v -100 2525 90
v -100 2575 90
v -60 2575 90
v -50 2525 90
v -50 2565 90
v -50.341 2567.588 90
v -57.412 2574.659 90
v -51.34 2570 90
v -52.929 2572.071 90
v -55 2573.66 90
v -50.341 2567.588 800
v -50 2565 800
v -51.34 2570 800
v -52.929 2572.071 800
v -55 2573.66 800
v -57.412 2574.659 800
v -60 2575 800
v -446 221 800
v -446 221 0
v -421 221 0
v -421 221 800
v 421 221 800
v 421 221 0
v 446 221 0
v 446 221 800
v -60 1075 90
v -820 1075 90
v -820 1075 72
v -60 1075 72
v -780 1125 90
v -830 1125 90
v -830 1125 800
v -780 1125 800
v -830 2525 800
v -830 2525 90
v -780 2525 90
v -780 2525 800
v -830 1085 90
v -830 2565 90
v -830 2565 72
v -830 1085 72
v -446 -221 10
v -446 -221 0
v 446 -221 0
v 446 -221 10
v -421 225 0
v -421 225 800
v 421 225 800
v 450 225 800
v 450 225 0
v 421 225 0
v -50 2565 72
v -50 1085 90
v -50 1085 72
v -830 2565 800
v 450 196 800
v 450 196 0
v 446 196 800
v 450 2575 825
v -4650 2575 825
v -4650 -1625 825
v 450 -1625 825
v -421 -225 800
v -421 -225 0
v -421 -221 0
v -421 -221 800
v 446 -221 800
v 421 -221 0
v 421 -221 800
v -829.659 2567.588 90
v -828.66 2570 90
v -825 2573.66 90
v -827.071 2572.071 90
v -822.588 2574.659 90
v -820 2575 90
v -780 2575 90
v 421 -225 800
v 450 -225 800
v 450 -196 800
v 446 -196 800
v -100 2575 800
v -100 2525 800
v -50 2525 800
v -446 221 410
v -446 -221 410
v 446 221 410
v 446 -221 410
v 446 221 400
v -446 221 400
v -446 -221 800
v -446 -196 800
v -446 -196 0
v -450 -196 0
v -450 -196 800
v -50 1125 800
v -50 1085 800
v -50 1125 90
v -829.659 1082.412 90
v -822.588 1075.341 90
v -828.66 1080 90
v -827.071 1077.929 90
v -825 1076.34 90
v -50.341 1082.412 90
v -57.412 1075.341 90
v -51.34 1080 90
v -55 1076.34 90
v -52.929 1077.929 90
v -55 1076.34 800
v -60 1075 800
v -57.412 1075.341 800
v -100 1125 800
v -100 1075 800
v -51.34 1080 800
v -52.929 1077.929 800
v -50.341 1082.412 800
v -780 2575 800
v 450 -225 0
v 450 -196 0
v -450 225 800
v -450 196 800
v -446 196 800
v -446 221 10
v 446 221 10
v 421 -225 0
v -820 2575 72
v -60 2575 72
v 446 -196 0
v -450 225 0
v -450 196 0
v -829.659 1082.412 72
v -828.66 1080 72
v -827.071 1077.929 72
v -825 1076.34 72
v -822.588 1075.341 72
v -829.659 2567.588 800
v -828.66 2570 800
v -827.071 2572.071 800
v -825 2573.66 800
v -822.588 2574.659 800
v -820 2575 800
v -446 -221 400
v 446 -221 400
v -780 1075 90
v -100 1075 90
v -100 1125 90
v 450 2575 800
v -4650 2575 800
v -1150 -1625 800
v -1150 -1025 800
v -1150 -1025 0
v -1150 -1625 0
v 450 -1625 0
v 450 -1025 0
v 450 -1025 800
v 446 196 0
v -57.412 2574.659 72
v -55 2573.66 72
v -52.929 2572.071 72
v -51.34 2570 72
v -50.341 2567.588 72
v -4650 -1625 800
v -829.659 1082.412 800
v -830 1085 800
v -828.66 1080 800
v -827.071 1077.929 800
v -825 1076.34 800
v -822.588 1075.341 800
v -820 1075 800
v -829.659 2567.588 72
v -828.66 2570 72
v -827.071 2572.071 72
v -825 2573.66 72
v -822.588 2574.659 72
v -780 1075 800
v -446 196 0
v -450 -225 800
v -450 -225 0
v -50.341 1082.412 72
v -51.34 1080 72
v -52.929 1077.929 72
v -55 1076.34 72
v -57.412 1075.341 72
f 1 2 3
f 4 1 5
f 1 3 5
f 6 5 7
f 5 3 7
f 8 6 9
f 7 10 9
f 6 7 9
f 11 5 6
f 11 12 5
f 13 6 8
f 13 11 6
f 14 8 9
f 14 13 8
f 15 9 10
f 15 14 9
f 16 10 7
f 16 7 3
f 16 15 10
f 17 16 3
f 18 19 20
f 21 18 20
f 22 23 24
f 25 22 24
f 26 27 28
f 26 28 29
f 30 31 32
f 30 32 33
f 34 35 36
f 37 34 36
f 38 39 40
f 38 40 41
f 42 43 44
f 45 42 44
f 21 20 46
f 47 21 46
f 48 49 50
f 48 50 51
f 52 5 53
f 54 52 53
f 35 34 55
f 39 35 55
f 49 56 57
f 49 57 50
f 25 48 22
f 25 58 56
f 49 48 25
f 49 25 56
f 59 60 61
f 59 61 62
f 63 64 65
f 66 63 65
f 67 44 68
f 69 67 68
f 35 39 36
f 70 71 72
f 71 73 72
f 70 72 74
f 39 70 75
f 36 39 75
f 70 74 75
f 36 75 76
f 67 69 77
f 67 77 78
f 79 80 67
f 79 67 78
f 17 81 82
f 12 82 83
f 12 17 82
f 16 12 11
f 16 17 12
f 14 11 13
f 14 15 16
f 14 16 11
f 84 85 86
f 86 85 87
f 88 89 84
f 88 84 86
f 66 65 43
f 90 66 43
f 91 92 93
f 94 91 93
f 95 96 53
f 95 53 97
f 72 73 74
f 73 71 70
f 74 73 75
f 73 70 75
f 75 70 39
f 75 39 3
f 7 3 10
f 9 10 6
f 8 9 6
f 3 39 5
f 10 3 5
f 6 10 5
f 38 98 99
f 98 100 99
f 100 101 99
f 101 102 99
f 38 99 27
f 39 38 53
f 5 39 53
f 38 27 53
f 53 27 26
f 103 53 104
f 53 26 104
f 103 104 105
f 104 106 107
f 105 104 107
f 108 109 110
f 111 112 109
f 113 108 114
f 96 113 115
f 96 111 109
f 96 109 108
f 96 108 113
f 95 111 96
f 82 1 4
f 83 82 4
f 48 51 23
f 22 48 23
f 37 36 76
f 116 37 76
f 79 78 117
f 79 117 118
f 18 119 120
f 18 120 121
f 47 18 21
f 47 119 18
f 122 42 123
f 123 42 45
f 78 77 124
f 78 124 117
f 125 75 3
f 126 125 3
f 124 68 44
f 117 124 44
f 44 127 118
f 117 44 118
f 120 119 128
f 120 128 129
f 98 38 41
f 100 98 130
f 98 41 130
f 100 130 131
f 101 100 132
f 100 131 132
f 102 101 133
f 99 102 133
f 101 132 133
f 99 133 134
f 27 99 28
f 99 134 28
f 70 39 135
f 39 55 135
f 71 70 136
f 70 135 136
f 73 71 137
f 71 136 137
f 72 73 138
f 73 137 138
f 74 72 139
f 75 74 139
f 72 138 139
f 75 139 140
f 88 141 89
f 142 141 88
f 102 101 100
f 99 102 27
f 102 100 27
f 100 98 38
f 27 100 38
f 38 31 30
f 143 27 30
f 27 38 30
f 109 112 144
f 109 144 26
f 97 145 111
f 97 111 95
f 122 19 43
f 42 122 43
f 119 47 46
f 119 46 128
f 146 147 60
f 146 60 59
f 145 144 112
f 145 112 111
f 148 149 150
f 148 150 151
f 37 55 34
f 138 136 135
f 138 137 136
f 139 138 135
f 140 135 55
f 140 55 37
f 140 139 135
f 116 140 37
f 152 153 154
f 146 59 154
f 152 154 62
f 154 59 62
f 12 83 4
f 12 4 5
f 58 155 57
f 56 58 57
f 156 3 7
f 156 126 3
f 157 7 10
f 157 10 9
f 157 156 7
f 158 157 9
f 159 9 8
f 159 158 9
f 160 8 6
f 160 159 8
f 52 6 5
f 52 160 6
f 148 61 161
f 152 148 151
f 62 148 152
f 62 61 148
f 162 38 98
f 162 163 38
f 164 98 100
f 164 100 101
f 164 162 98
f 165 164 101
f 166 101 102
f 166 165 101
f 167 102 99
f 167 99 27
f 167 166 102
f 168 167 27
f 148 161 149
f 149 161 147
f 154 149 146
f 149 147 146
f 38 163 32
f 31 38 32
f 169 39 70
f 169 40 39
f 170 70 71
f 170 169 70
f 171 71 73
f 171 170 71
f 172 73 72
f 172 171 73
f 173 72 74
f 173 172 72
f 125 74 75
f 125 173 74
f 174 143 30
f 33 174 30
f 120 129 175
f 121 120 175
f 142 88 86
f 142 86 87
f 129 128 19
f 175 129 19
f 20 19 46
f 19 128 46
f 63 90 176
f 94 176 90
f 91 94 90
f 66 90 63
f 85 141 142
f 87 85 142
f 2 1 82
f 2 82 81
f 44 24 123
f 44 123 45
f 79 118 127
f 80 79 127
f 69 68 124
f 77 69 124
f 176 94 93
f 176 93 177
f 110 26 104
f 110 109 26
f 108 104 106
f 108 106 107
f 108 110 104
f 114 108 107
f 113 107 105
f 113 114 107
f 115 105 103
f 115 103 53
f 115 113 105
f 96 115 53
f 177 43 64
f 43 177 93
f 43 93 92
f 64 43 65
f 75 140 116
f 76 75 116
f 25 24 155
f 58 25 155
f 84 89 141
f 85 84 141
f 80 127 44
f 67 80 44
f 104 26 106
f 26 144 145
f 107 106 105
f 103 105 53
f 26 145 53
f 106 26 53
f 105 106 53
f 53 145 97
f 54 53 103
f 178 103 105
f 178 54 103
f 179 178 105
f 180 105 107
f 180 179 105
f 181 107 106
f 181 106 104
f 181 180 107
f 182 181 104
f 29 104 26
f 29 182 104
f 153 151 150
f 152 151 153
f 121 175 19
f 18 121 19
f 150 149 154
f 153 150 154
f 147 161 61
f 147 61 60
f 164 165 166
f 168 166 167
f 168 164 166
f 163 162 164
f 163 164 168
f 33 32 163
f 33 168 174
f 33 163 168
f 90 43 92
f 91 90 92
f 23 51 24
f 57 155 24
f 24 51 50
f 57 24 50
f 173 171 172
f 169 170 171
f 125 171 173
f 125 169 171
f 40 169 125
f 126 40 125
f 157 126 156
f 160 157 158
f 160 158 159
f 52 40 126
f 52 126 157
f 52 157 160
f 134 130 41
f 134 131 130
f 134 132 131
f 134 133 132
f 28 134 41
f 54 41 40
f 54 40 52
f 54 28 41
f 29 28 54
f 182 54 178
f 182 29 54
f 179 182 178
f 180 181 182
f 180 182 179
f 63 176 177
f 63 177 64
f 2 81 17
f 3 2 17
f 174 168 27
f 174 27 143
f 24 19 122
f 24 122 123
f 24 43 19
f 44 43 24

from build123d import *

# Parameters (mm, degrees)
F1_DEPTH  = 800
F2_W      = 892
F2_H      = 442
F3_DEPTH  = 10
F5_W      = 892
F5_H      = 442
F6_DEPTH  = 10
F7_W      = 5100
F7_H      = 4200
F8_DEPTH  = 25
F9_W      = 1600
F9_H      = 600
F10_DEPTH = 800
F12_W     = 780
F12_H     = 1500
F13_DEPTH = 18
F14_W     = 50
F14_H     = 50
F15_DEPTH = 710
F16_R     = 10
F16_2_R   = 10
F16_3_R   = 10
F16_4_R   = 10
F16_5_R   = 10


with BuildPart() as f1:
    # F0 (on Top) → F1 (new body)
    with BuildSketch(Plane.XY):
        Polygon((-421, 225), (-450, 225), (-450, 196), (-446, 196), (-446, 221), (-421, 221), align=None)
    extrude(amount=F1_DEPTH)


with BuildPart() as f1b:
    # F0 (on Top) → F1, piece 2 (new body)
    with BuildSketch(Plane.XY):
        Polygon((-446, -221), (-446, -196), (-450, -196), (-450, -225), (-421, -225), (-421, -221), align=None)
    extrude(amount=F1_DEPTH)


with BuildPart() as f1c:
    # F0 (on Top) → F1, piece 3 (new body)
    with BuildSketch(Plane.XY):
        Polygon((421, -221), (421, -225), (450, -225), (450, -196), (446, -196), (446, -221), align=None)
    extrude(amount=F1_DEPTH)


with BuildPart() as f1d:
    # F0 (on Top) → F1, piece 4 (new body)
    with BuildSketch(Plane.XY):
        Polygon((450, 196), (450, 225), (421, 225), (421, 221), (446, 221), (446, 196), align=None)
    extrude(amount=F1_DEPTH)


with BuildPart() as f3:
    # F2 (on face) → F3 (new body)
    with BuildSketch(Plane(origin=(0, 0, 0), x_dir=(1, 0, 0), z_dir=(0, 0, -1))):
        Rectangle(F2_W, F2_H)
    extrude(amount=-F3_DEPTH)


with BuildPart() as f6:
    # F5 (on offset) → F6 (new body)
    with BuildSketch(Plane(origin=(0, 0, 400), x_dir=(1, 0, 0), z_dir=(0, 0, -1))):
        Rectangle(F5_W, F5_H)
    extrude(amount=-F6_DEPTH)


with BuildPart() as f8:
    # F7 (on face) → F8 (new body)
    with BuildSketch(Plane.XY.offset(800)):
        with Locations((-2100, 475)):
            Rectangle(F7_W, F7_H)
    extrude(amount=F8_DEPTH)

    # F9 (on face) → F10 (join)
    with BuildSketch(Plane(origin=(0, 0, 800), x_dir=(1, 0, 0), z_dir=(0, 0, -1))):
        with Locations((-350, 1325)):
            Rectangle(F9_W, F9_H)
    extrude(amount=F10_DEPTH)


with BuildPart() as f13:
    # F12 (on offset) → F13 (new body)
    with BuildSketch(Plane(origin=(0, 0, 90), x_dir=(1, 0, 0), z_dir=(0, 0, -1))):
        with Locations((-440, -1825)):
            Rectangle(F12_W, F12_H)
    extrude(amount=F13_DEPTH)

    # F16
    f16_edges = [f13.edges().sort_by_distance(p)[0] for p in [
        (-50, 1075, 81),
        (-50, 2575, 81),
        (-830, 2575, 81),
        (-830, 1075, 81),
    ]]
    fillet(f16_edges, radius=F16_R)


with BuildPart() as f15:
    # F14 (on face) → F15 (new body, through all)
    with BuildSketch(Plane.XY.offset(90)):
        with Locations((-805, 1100)):
            Rectangle(F14_W, F14_H)
    extrude(amount=F15_DEPTH)

    # F16#5
    f16_5_edges = [f15.edges().sort_by_distance(p)[0] for p in [
        (-830, 1075, 445),
    ]]
    fillet(f16_5_edges, radius=F16_5_R)


with BuildPart() as f15b:
    # F14 (on face) → F15, piece 2 (new body, through all)
    with BuildSketch(Plane.XY.offset(90)):
        with Locations((-75, 1100)):
            Rectangle(F14_W, F14_H)
    extrude(amount=F15_DEPTH)

    # F16#4
    f16_4_edges = [f15b.edges().sort_by_distance(p)[0] for p in [
        (-50, 1075, 445),
    ]]
    fillet(f16_4_edges, radius=F16_4_R)


with BuildPart() as f15c:
    # F14 (on face) → F15, piece 3 (new body, through all)
    with BuildSketch(Plane.XY.offset(90)):
        with Locations((-75, 2550)):
            Rectangle(F14_W, F14_H)
    extrude(amount=F15_DEPTH)

    # F16#3
    f16_3_edges = [f15c.edges().sort_by_distance(p)[0] for p in [
        (-50, 2575, 445),
    ]]
    fillet(f16_3_edges, radius=F16_3_R)


with BuildPart() as f15d:
    # F14 (on face) → F15, piece 4 (new body, through all)
    with BuildSketch(Plane.XY.offset(90)):
        with Locations((-805, 2550)):
            Rectangle(F14_W, F14_H)
    extrude(amount=F15_DEPTH)

    # F16#2
    f16_2_edges = [f15d.edges().sort_by_distance(p)[0] for p in [
        (-830, 2575, 445),
    ]]
    fillet(f16_2_edges, radius=F16_2_R)


solid = Compound([f1.part, f1b.part, f1c.part, f1d.part, f3.part, f6.part, f8.part, f13.part, f15.part, f15b.part, f15c.part, f15d.part])
